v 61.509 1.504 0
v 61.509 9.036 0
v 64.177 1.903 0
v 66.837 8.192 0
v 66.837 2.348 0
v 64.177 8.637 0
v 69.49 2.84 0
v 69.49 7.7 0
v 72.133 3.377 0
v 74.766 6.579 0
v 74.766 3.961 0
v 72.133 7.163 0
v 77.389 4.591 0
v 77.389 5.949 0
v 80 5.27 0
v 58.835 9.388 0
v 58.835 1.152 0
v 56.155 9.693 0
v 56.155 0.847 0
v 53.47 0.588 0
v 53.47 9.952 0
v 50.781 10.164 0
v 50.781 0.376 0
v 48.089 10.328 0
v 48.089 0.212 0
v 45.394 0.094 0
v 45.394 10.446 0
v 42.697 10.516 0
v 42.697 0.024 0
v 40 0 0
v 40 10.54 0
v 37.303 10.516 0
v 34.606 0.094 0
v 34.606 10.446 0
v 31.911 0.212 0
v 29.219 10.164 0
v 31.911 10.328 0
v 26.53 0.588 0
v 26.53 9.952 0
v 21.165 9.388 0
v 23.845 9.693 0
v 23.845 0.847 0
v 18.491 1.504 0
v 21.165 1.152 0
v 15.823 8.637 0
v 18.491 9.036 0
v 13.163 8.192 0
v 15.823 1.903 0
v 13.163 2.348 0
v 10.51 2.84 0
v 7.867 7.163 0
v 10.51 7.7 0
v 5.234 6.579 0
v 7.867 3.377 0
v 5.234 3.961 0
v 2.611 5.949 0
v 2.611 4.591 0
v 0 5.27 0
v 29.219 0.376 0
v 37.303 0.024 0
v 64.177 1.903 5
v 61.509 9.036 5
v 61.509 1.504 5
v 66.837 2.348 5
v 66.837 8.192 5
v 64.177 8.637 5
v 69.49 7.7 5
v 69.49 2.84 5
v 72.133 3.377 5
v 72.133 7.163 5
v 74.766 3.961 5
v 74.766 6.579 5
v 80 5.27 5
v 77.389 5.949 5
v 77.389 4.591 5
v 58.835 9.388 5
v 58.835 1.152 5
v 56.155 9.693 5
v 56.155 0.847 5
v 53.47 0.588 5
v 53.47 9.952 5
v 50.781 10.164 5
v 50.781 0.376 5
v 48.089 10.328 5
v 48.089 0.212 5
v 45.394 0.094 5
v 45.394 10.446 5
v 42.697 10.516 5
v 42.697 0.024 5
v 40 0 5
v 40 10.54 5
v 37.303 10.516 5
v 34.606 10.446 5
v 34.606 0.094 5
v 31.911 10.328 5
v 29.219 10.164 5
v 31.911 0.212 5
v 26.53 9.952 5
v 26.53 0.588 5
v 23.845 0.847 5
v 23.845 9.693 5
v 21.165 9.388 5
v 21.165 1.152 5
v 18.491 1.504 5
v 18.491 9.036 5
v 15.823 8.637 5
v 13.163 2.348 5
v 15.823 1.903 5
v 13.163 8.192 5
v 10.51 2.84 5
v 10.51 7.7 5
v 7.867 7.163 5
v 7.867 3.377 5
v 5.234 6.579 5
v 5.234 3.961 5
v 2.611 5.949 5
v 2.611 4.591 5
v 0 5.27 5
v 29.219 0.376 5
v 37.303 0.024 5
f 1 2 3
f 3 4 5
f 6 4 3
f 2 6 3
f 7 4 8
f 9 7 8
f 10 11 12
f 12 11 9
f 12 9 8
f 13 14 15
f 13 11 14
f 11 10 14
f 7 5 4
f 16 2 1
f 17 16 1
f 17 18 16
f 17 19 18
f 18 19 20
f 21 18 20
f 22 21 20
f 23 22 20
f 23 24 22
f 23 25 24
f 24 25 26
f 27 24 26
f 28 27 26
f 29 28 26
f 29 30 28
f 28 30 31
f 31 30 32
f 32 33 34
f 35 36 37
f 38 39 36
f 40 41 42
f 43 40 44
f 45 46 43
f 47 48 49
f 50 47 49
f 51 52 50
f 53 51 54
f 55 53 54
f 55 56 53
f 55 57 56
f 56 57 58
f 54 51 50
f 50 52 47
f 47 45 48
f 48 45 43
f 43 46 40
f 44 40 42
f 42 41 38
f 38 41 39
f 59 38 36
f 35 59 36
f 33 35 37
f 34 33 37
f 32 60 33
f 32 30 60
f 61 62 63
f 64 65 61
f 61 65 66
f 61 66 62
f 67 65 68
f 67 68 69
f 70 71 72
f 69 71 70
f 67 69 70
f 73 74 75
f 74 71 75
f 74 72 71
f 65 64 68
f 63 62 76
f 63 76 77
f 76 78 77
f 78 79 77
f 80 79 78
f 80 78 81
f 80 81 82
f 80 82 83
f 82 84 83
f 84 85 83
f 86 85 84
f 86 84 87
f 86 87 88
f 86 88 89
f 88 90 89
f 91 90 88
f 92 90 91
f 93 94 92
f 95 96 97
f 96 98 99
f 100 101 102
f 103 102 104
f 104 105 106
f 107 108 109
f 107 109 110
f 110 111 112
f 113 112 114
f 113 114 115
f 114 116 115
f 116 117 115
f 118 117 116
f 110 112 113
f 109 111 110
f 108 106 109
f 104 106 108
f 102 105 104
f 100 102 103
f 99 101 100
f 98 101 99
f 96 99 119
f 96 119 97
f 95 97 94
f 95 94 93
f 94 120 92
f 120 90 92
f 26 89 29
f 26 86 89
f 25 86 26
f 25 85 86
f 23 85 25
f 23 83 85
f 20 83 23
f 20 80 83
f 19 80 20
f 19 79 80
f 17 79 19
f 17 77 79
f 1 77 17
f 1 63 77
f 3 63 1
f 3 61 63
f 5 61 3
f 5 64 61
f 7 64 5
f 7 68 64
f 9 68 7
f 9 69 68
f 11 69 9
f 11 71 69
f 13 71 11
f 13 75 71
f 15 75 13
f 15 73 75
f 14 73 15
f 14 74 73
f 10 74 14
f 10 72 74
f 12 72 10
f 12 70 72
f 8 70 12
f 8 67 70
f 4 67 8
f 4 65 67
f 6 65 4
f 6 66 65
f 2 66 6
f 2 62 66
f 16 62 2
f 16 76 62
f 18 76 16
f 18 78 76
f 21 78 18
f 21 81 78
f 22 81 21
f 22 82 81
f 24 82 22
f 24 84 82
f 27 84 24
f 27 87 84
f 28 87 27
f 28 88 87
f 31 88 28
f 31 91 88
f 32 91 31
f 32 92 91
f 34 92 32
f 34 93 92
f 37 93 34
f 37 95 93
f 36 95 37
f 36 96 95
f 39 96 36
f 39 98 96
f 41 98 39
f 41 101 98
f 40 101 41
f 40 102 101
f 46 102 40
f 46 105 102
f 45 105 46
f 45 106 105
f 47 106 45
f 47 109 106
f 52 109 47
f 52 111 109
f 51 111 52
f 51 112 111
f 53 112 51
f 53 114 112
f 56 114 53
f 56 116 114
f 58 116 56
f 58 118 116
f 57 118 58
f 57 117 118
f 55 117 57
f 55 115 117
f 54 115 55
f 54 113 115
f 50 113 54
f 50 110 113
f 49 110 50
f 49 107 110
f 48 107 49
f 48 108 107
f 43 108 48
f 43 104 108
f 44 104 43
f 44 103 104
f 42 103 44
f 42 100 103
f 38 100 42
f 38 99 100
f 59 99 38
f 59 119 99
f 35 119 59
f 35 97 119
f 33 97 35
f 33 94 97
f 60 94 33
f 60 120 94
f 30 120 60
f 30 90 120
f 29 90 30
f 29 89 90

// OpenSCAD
$fn = 32;

// ----------------------------------------------------------------------
// Arc profile plate: lens, 60 points
// ----------------------------------------------------------------------

// --- parameters (mm) ---
lens_chord = 80;          // chord length of the lens, X
arc_r = 154.55;           // radius of both arcs
arc_angle = 30;           // angle of each arc, degrees
sagitta = 5.27;           // bulge of each arc (half the lens height)
arc_step = 1;             // sampling step of the arcs, degrees
plate_t = 5;              // plate thickness, Z

bbox_y = 2 * sagitta;  // full lens height

profile = [[80, 5.27], [77.389, 5.949], [74.766, 6.579], [72.133, 7.163], [69.49, 7.7], [66.837, 8.192], [64.177, 8.637], [61.509, 9.036], [58.835, 9.388], [56.155, 9.693], [53.47, 9.952], [50.781, 10.164], [48.089, 10.328], [45.394, 10.446], [42.697, 10.516], [40, 10.54], [37.303, 10.516], [34.606, 10.446], [31.911, 10.328], [29.219, 10.164], [26.53, 9.952], [23.845, 9.693], [21.165, 9.388], [18.491, 9.036], [15.823, 8.637], [13.163, 8.192], [10.51, 7.7], [7.867, 7.163], [5.234, 6.579], [2.611, 5.949], [0, 5.27], [2.611, 4.591], [5.234, 3.961], [7.867, 3.377], [10.51, 2.84], [13.163, 2.348], [15.823, 1.903], [18.491, 1.504], [21.165, 1.152], [23.845, 0.847], [26.53, 0.588], [29.219, 0.376], [31.911, 0.212], [34.606, 0.094], [37.303, 0.024], [40, 0], [42.697, 0.024], [45.394, 0.094], [48.089, 0.212], [50.781, 0.376], [53.47, 0.588], [56.155, 0.847], [58.835, 1.152], [61.509, 1.504], [64.177, 1.903], [66.837, 2.348], [69.49, 2.84], [72.133, 3.377], [74.766, 3.961], [77.389, 4.591]];  // primary outline, 60 points, counter clockwise

// --- the one profile operation ---
linear_extrude(height = plate_t) polygon(points = profile);
